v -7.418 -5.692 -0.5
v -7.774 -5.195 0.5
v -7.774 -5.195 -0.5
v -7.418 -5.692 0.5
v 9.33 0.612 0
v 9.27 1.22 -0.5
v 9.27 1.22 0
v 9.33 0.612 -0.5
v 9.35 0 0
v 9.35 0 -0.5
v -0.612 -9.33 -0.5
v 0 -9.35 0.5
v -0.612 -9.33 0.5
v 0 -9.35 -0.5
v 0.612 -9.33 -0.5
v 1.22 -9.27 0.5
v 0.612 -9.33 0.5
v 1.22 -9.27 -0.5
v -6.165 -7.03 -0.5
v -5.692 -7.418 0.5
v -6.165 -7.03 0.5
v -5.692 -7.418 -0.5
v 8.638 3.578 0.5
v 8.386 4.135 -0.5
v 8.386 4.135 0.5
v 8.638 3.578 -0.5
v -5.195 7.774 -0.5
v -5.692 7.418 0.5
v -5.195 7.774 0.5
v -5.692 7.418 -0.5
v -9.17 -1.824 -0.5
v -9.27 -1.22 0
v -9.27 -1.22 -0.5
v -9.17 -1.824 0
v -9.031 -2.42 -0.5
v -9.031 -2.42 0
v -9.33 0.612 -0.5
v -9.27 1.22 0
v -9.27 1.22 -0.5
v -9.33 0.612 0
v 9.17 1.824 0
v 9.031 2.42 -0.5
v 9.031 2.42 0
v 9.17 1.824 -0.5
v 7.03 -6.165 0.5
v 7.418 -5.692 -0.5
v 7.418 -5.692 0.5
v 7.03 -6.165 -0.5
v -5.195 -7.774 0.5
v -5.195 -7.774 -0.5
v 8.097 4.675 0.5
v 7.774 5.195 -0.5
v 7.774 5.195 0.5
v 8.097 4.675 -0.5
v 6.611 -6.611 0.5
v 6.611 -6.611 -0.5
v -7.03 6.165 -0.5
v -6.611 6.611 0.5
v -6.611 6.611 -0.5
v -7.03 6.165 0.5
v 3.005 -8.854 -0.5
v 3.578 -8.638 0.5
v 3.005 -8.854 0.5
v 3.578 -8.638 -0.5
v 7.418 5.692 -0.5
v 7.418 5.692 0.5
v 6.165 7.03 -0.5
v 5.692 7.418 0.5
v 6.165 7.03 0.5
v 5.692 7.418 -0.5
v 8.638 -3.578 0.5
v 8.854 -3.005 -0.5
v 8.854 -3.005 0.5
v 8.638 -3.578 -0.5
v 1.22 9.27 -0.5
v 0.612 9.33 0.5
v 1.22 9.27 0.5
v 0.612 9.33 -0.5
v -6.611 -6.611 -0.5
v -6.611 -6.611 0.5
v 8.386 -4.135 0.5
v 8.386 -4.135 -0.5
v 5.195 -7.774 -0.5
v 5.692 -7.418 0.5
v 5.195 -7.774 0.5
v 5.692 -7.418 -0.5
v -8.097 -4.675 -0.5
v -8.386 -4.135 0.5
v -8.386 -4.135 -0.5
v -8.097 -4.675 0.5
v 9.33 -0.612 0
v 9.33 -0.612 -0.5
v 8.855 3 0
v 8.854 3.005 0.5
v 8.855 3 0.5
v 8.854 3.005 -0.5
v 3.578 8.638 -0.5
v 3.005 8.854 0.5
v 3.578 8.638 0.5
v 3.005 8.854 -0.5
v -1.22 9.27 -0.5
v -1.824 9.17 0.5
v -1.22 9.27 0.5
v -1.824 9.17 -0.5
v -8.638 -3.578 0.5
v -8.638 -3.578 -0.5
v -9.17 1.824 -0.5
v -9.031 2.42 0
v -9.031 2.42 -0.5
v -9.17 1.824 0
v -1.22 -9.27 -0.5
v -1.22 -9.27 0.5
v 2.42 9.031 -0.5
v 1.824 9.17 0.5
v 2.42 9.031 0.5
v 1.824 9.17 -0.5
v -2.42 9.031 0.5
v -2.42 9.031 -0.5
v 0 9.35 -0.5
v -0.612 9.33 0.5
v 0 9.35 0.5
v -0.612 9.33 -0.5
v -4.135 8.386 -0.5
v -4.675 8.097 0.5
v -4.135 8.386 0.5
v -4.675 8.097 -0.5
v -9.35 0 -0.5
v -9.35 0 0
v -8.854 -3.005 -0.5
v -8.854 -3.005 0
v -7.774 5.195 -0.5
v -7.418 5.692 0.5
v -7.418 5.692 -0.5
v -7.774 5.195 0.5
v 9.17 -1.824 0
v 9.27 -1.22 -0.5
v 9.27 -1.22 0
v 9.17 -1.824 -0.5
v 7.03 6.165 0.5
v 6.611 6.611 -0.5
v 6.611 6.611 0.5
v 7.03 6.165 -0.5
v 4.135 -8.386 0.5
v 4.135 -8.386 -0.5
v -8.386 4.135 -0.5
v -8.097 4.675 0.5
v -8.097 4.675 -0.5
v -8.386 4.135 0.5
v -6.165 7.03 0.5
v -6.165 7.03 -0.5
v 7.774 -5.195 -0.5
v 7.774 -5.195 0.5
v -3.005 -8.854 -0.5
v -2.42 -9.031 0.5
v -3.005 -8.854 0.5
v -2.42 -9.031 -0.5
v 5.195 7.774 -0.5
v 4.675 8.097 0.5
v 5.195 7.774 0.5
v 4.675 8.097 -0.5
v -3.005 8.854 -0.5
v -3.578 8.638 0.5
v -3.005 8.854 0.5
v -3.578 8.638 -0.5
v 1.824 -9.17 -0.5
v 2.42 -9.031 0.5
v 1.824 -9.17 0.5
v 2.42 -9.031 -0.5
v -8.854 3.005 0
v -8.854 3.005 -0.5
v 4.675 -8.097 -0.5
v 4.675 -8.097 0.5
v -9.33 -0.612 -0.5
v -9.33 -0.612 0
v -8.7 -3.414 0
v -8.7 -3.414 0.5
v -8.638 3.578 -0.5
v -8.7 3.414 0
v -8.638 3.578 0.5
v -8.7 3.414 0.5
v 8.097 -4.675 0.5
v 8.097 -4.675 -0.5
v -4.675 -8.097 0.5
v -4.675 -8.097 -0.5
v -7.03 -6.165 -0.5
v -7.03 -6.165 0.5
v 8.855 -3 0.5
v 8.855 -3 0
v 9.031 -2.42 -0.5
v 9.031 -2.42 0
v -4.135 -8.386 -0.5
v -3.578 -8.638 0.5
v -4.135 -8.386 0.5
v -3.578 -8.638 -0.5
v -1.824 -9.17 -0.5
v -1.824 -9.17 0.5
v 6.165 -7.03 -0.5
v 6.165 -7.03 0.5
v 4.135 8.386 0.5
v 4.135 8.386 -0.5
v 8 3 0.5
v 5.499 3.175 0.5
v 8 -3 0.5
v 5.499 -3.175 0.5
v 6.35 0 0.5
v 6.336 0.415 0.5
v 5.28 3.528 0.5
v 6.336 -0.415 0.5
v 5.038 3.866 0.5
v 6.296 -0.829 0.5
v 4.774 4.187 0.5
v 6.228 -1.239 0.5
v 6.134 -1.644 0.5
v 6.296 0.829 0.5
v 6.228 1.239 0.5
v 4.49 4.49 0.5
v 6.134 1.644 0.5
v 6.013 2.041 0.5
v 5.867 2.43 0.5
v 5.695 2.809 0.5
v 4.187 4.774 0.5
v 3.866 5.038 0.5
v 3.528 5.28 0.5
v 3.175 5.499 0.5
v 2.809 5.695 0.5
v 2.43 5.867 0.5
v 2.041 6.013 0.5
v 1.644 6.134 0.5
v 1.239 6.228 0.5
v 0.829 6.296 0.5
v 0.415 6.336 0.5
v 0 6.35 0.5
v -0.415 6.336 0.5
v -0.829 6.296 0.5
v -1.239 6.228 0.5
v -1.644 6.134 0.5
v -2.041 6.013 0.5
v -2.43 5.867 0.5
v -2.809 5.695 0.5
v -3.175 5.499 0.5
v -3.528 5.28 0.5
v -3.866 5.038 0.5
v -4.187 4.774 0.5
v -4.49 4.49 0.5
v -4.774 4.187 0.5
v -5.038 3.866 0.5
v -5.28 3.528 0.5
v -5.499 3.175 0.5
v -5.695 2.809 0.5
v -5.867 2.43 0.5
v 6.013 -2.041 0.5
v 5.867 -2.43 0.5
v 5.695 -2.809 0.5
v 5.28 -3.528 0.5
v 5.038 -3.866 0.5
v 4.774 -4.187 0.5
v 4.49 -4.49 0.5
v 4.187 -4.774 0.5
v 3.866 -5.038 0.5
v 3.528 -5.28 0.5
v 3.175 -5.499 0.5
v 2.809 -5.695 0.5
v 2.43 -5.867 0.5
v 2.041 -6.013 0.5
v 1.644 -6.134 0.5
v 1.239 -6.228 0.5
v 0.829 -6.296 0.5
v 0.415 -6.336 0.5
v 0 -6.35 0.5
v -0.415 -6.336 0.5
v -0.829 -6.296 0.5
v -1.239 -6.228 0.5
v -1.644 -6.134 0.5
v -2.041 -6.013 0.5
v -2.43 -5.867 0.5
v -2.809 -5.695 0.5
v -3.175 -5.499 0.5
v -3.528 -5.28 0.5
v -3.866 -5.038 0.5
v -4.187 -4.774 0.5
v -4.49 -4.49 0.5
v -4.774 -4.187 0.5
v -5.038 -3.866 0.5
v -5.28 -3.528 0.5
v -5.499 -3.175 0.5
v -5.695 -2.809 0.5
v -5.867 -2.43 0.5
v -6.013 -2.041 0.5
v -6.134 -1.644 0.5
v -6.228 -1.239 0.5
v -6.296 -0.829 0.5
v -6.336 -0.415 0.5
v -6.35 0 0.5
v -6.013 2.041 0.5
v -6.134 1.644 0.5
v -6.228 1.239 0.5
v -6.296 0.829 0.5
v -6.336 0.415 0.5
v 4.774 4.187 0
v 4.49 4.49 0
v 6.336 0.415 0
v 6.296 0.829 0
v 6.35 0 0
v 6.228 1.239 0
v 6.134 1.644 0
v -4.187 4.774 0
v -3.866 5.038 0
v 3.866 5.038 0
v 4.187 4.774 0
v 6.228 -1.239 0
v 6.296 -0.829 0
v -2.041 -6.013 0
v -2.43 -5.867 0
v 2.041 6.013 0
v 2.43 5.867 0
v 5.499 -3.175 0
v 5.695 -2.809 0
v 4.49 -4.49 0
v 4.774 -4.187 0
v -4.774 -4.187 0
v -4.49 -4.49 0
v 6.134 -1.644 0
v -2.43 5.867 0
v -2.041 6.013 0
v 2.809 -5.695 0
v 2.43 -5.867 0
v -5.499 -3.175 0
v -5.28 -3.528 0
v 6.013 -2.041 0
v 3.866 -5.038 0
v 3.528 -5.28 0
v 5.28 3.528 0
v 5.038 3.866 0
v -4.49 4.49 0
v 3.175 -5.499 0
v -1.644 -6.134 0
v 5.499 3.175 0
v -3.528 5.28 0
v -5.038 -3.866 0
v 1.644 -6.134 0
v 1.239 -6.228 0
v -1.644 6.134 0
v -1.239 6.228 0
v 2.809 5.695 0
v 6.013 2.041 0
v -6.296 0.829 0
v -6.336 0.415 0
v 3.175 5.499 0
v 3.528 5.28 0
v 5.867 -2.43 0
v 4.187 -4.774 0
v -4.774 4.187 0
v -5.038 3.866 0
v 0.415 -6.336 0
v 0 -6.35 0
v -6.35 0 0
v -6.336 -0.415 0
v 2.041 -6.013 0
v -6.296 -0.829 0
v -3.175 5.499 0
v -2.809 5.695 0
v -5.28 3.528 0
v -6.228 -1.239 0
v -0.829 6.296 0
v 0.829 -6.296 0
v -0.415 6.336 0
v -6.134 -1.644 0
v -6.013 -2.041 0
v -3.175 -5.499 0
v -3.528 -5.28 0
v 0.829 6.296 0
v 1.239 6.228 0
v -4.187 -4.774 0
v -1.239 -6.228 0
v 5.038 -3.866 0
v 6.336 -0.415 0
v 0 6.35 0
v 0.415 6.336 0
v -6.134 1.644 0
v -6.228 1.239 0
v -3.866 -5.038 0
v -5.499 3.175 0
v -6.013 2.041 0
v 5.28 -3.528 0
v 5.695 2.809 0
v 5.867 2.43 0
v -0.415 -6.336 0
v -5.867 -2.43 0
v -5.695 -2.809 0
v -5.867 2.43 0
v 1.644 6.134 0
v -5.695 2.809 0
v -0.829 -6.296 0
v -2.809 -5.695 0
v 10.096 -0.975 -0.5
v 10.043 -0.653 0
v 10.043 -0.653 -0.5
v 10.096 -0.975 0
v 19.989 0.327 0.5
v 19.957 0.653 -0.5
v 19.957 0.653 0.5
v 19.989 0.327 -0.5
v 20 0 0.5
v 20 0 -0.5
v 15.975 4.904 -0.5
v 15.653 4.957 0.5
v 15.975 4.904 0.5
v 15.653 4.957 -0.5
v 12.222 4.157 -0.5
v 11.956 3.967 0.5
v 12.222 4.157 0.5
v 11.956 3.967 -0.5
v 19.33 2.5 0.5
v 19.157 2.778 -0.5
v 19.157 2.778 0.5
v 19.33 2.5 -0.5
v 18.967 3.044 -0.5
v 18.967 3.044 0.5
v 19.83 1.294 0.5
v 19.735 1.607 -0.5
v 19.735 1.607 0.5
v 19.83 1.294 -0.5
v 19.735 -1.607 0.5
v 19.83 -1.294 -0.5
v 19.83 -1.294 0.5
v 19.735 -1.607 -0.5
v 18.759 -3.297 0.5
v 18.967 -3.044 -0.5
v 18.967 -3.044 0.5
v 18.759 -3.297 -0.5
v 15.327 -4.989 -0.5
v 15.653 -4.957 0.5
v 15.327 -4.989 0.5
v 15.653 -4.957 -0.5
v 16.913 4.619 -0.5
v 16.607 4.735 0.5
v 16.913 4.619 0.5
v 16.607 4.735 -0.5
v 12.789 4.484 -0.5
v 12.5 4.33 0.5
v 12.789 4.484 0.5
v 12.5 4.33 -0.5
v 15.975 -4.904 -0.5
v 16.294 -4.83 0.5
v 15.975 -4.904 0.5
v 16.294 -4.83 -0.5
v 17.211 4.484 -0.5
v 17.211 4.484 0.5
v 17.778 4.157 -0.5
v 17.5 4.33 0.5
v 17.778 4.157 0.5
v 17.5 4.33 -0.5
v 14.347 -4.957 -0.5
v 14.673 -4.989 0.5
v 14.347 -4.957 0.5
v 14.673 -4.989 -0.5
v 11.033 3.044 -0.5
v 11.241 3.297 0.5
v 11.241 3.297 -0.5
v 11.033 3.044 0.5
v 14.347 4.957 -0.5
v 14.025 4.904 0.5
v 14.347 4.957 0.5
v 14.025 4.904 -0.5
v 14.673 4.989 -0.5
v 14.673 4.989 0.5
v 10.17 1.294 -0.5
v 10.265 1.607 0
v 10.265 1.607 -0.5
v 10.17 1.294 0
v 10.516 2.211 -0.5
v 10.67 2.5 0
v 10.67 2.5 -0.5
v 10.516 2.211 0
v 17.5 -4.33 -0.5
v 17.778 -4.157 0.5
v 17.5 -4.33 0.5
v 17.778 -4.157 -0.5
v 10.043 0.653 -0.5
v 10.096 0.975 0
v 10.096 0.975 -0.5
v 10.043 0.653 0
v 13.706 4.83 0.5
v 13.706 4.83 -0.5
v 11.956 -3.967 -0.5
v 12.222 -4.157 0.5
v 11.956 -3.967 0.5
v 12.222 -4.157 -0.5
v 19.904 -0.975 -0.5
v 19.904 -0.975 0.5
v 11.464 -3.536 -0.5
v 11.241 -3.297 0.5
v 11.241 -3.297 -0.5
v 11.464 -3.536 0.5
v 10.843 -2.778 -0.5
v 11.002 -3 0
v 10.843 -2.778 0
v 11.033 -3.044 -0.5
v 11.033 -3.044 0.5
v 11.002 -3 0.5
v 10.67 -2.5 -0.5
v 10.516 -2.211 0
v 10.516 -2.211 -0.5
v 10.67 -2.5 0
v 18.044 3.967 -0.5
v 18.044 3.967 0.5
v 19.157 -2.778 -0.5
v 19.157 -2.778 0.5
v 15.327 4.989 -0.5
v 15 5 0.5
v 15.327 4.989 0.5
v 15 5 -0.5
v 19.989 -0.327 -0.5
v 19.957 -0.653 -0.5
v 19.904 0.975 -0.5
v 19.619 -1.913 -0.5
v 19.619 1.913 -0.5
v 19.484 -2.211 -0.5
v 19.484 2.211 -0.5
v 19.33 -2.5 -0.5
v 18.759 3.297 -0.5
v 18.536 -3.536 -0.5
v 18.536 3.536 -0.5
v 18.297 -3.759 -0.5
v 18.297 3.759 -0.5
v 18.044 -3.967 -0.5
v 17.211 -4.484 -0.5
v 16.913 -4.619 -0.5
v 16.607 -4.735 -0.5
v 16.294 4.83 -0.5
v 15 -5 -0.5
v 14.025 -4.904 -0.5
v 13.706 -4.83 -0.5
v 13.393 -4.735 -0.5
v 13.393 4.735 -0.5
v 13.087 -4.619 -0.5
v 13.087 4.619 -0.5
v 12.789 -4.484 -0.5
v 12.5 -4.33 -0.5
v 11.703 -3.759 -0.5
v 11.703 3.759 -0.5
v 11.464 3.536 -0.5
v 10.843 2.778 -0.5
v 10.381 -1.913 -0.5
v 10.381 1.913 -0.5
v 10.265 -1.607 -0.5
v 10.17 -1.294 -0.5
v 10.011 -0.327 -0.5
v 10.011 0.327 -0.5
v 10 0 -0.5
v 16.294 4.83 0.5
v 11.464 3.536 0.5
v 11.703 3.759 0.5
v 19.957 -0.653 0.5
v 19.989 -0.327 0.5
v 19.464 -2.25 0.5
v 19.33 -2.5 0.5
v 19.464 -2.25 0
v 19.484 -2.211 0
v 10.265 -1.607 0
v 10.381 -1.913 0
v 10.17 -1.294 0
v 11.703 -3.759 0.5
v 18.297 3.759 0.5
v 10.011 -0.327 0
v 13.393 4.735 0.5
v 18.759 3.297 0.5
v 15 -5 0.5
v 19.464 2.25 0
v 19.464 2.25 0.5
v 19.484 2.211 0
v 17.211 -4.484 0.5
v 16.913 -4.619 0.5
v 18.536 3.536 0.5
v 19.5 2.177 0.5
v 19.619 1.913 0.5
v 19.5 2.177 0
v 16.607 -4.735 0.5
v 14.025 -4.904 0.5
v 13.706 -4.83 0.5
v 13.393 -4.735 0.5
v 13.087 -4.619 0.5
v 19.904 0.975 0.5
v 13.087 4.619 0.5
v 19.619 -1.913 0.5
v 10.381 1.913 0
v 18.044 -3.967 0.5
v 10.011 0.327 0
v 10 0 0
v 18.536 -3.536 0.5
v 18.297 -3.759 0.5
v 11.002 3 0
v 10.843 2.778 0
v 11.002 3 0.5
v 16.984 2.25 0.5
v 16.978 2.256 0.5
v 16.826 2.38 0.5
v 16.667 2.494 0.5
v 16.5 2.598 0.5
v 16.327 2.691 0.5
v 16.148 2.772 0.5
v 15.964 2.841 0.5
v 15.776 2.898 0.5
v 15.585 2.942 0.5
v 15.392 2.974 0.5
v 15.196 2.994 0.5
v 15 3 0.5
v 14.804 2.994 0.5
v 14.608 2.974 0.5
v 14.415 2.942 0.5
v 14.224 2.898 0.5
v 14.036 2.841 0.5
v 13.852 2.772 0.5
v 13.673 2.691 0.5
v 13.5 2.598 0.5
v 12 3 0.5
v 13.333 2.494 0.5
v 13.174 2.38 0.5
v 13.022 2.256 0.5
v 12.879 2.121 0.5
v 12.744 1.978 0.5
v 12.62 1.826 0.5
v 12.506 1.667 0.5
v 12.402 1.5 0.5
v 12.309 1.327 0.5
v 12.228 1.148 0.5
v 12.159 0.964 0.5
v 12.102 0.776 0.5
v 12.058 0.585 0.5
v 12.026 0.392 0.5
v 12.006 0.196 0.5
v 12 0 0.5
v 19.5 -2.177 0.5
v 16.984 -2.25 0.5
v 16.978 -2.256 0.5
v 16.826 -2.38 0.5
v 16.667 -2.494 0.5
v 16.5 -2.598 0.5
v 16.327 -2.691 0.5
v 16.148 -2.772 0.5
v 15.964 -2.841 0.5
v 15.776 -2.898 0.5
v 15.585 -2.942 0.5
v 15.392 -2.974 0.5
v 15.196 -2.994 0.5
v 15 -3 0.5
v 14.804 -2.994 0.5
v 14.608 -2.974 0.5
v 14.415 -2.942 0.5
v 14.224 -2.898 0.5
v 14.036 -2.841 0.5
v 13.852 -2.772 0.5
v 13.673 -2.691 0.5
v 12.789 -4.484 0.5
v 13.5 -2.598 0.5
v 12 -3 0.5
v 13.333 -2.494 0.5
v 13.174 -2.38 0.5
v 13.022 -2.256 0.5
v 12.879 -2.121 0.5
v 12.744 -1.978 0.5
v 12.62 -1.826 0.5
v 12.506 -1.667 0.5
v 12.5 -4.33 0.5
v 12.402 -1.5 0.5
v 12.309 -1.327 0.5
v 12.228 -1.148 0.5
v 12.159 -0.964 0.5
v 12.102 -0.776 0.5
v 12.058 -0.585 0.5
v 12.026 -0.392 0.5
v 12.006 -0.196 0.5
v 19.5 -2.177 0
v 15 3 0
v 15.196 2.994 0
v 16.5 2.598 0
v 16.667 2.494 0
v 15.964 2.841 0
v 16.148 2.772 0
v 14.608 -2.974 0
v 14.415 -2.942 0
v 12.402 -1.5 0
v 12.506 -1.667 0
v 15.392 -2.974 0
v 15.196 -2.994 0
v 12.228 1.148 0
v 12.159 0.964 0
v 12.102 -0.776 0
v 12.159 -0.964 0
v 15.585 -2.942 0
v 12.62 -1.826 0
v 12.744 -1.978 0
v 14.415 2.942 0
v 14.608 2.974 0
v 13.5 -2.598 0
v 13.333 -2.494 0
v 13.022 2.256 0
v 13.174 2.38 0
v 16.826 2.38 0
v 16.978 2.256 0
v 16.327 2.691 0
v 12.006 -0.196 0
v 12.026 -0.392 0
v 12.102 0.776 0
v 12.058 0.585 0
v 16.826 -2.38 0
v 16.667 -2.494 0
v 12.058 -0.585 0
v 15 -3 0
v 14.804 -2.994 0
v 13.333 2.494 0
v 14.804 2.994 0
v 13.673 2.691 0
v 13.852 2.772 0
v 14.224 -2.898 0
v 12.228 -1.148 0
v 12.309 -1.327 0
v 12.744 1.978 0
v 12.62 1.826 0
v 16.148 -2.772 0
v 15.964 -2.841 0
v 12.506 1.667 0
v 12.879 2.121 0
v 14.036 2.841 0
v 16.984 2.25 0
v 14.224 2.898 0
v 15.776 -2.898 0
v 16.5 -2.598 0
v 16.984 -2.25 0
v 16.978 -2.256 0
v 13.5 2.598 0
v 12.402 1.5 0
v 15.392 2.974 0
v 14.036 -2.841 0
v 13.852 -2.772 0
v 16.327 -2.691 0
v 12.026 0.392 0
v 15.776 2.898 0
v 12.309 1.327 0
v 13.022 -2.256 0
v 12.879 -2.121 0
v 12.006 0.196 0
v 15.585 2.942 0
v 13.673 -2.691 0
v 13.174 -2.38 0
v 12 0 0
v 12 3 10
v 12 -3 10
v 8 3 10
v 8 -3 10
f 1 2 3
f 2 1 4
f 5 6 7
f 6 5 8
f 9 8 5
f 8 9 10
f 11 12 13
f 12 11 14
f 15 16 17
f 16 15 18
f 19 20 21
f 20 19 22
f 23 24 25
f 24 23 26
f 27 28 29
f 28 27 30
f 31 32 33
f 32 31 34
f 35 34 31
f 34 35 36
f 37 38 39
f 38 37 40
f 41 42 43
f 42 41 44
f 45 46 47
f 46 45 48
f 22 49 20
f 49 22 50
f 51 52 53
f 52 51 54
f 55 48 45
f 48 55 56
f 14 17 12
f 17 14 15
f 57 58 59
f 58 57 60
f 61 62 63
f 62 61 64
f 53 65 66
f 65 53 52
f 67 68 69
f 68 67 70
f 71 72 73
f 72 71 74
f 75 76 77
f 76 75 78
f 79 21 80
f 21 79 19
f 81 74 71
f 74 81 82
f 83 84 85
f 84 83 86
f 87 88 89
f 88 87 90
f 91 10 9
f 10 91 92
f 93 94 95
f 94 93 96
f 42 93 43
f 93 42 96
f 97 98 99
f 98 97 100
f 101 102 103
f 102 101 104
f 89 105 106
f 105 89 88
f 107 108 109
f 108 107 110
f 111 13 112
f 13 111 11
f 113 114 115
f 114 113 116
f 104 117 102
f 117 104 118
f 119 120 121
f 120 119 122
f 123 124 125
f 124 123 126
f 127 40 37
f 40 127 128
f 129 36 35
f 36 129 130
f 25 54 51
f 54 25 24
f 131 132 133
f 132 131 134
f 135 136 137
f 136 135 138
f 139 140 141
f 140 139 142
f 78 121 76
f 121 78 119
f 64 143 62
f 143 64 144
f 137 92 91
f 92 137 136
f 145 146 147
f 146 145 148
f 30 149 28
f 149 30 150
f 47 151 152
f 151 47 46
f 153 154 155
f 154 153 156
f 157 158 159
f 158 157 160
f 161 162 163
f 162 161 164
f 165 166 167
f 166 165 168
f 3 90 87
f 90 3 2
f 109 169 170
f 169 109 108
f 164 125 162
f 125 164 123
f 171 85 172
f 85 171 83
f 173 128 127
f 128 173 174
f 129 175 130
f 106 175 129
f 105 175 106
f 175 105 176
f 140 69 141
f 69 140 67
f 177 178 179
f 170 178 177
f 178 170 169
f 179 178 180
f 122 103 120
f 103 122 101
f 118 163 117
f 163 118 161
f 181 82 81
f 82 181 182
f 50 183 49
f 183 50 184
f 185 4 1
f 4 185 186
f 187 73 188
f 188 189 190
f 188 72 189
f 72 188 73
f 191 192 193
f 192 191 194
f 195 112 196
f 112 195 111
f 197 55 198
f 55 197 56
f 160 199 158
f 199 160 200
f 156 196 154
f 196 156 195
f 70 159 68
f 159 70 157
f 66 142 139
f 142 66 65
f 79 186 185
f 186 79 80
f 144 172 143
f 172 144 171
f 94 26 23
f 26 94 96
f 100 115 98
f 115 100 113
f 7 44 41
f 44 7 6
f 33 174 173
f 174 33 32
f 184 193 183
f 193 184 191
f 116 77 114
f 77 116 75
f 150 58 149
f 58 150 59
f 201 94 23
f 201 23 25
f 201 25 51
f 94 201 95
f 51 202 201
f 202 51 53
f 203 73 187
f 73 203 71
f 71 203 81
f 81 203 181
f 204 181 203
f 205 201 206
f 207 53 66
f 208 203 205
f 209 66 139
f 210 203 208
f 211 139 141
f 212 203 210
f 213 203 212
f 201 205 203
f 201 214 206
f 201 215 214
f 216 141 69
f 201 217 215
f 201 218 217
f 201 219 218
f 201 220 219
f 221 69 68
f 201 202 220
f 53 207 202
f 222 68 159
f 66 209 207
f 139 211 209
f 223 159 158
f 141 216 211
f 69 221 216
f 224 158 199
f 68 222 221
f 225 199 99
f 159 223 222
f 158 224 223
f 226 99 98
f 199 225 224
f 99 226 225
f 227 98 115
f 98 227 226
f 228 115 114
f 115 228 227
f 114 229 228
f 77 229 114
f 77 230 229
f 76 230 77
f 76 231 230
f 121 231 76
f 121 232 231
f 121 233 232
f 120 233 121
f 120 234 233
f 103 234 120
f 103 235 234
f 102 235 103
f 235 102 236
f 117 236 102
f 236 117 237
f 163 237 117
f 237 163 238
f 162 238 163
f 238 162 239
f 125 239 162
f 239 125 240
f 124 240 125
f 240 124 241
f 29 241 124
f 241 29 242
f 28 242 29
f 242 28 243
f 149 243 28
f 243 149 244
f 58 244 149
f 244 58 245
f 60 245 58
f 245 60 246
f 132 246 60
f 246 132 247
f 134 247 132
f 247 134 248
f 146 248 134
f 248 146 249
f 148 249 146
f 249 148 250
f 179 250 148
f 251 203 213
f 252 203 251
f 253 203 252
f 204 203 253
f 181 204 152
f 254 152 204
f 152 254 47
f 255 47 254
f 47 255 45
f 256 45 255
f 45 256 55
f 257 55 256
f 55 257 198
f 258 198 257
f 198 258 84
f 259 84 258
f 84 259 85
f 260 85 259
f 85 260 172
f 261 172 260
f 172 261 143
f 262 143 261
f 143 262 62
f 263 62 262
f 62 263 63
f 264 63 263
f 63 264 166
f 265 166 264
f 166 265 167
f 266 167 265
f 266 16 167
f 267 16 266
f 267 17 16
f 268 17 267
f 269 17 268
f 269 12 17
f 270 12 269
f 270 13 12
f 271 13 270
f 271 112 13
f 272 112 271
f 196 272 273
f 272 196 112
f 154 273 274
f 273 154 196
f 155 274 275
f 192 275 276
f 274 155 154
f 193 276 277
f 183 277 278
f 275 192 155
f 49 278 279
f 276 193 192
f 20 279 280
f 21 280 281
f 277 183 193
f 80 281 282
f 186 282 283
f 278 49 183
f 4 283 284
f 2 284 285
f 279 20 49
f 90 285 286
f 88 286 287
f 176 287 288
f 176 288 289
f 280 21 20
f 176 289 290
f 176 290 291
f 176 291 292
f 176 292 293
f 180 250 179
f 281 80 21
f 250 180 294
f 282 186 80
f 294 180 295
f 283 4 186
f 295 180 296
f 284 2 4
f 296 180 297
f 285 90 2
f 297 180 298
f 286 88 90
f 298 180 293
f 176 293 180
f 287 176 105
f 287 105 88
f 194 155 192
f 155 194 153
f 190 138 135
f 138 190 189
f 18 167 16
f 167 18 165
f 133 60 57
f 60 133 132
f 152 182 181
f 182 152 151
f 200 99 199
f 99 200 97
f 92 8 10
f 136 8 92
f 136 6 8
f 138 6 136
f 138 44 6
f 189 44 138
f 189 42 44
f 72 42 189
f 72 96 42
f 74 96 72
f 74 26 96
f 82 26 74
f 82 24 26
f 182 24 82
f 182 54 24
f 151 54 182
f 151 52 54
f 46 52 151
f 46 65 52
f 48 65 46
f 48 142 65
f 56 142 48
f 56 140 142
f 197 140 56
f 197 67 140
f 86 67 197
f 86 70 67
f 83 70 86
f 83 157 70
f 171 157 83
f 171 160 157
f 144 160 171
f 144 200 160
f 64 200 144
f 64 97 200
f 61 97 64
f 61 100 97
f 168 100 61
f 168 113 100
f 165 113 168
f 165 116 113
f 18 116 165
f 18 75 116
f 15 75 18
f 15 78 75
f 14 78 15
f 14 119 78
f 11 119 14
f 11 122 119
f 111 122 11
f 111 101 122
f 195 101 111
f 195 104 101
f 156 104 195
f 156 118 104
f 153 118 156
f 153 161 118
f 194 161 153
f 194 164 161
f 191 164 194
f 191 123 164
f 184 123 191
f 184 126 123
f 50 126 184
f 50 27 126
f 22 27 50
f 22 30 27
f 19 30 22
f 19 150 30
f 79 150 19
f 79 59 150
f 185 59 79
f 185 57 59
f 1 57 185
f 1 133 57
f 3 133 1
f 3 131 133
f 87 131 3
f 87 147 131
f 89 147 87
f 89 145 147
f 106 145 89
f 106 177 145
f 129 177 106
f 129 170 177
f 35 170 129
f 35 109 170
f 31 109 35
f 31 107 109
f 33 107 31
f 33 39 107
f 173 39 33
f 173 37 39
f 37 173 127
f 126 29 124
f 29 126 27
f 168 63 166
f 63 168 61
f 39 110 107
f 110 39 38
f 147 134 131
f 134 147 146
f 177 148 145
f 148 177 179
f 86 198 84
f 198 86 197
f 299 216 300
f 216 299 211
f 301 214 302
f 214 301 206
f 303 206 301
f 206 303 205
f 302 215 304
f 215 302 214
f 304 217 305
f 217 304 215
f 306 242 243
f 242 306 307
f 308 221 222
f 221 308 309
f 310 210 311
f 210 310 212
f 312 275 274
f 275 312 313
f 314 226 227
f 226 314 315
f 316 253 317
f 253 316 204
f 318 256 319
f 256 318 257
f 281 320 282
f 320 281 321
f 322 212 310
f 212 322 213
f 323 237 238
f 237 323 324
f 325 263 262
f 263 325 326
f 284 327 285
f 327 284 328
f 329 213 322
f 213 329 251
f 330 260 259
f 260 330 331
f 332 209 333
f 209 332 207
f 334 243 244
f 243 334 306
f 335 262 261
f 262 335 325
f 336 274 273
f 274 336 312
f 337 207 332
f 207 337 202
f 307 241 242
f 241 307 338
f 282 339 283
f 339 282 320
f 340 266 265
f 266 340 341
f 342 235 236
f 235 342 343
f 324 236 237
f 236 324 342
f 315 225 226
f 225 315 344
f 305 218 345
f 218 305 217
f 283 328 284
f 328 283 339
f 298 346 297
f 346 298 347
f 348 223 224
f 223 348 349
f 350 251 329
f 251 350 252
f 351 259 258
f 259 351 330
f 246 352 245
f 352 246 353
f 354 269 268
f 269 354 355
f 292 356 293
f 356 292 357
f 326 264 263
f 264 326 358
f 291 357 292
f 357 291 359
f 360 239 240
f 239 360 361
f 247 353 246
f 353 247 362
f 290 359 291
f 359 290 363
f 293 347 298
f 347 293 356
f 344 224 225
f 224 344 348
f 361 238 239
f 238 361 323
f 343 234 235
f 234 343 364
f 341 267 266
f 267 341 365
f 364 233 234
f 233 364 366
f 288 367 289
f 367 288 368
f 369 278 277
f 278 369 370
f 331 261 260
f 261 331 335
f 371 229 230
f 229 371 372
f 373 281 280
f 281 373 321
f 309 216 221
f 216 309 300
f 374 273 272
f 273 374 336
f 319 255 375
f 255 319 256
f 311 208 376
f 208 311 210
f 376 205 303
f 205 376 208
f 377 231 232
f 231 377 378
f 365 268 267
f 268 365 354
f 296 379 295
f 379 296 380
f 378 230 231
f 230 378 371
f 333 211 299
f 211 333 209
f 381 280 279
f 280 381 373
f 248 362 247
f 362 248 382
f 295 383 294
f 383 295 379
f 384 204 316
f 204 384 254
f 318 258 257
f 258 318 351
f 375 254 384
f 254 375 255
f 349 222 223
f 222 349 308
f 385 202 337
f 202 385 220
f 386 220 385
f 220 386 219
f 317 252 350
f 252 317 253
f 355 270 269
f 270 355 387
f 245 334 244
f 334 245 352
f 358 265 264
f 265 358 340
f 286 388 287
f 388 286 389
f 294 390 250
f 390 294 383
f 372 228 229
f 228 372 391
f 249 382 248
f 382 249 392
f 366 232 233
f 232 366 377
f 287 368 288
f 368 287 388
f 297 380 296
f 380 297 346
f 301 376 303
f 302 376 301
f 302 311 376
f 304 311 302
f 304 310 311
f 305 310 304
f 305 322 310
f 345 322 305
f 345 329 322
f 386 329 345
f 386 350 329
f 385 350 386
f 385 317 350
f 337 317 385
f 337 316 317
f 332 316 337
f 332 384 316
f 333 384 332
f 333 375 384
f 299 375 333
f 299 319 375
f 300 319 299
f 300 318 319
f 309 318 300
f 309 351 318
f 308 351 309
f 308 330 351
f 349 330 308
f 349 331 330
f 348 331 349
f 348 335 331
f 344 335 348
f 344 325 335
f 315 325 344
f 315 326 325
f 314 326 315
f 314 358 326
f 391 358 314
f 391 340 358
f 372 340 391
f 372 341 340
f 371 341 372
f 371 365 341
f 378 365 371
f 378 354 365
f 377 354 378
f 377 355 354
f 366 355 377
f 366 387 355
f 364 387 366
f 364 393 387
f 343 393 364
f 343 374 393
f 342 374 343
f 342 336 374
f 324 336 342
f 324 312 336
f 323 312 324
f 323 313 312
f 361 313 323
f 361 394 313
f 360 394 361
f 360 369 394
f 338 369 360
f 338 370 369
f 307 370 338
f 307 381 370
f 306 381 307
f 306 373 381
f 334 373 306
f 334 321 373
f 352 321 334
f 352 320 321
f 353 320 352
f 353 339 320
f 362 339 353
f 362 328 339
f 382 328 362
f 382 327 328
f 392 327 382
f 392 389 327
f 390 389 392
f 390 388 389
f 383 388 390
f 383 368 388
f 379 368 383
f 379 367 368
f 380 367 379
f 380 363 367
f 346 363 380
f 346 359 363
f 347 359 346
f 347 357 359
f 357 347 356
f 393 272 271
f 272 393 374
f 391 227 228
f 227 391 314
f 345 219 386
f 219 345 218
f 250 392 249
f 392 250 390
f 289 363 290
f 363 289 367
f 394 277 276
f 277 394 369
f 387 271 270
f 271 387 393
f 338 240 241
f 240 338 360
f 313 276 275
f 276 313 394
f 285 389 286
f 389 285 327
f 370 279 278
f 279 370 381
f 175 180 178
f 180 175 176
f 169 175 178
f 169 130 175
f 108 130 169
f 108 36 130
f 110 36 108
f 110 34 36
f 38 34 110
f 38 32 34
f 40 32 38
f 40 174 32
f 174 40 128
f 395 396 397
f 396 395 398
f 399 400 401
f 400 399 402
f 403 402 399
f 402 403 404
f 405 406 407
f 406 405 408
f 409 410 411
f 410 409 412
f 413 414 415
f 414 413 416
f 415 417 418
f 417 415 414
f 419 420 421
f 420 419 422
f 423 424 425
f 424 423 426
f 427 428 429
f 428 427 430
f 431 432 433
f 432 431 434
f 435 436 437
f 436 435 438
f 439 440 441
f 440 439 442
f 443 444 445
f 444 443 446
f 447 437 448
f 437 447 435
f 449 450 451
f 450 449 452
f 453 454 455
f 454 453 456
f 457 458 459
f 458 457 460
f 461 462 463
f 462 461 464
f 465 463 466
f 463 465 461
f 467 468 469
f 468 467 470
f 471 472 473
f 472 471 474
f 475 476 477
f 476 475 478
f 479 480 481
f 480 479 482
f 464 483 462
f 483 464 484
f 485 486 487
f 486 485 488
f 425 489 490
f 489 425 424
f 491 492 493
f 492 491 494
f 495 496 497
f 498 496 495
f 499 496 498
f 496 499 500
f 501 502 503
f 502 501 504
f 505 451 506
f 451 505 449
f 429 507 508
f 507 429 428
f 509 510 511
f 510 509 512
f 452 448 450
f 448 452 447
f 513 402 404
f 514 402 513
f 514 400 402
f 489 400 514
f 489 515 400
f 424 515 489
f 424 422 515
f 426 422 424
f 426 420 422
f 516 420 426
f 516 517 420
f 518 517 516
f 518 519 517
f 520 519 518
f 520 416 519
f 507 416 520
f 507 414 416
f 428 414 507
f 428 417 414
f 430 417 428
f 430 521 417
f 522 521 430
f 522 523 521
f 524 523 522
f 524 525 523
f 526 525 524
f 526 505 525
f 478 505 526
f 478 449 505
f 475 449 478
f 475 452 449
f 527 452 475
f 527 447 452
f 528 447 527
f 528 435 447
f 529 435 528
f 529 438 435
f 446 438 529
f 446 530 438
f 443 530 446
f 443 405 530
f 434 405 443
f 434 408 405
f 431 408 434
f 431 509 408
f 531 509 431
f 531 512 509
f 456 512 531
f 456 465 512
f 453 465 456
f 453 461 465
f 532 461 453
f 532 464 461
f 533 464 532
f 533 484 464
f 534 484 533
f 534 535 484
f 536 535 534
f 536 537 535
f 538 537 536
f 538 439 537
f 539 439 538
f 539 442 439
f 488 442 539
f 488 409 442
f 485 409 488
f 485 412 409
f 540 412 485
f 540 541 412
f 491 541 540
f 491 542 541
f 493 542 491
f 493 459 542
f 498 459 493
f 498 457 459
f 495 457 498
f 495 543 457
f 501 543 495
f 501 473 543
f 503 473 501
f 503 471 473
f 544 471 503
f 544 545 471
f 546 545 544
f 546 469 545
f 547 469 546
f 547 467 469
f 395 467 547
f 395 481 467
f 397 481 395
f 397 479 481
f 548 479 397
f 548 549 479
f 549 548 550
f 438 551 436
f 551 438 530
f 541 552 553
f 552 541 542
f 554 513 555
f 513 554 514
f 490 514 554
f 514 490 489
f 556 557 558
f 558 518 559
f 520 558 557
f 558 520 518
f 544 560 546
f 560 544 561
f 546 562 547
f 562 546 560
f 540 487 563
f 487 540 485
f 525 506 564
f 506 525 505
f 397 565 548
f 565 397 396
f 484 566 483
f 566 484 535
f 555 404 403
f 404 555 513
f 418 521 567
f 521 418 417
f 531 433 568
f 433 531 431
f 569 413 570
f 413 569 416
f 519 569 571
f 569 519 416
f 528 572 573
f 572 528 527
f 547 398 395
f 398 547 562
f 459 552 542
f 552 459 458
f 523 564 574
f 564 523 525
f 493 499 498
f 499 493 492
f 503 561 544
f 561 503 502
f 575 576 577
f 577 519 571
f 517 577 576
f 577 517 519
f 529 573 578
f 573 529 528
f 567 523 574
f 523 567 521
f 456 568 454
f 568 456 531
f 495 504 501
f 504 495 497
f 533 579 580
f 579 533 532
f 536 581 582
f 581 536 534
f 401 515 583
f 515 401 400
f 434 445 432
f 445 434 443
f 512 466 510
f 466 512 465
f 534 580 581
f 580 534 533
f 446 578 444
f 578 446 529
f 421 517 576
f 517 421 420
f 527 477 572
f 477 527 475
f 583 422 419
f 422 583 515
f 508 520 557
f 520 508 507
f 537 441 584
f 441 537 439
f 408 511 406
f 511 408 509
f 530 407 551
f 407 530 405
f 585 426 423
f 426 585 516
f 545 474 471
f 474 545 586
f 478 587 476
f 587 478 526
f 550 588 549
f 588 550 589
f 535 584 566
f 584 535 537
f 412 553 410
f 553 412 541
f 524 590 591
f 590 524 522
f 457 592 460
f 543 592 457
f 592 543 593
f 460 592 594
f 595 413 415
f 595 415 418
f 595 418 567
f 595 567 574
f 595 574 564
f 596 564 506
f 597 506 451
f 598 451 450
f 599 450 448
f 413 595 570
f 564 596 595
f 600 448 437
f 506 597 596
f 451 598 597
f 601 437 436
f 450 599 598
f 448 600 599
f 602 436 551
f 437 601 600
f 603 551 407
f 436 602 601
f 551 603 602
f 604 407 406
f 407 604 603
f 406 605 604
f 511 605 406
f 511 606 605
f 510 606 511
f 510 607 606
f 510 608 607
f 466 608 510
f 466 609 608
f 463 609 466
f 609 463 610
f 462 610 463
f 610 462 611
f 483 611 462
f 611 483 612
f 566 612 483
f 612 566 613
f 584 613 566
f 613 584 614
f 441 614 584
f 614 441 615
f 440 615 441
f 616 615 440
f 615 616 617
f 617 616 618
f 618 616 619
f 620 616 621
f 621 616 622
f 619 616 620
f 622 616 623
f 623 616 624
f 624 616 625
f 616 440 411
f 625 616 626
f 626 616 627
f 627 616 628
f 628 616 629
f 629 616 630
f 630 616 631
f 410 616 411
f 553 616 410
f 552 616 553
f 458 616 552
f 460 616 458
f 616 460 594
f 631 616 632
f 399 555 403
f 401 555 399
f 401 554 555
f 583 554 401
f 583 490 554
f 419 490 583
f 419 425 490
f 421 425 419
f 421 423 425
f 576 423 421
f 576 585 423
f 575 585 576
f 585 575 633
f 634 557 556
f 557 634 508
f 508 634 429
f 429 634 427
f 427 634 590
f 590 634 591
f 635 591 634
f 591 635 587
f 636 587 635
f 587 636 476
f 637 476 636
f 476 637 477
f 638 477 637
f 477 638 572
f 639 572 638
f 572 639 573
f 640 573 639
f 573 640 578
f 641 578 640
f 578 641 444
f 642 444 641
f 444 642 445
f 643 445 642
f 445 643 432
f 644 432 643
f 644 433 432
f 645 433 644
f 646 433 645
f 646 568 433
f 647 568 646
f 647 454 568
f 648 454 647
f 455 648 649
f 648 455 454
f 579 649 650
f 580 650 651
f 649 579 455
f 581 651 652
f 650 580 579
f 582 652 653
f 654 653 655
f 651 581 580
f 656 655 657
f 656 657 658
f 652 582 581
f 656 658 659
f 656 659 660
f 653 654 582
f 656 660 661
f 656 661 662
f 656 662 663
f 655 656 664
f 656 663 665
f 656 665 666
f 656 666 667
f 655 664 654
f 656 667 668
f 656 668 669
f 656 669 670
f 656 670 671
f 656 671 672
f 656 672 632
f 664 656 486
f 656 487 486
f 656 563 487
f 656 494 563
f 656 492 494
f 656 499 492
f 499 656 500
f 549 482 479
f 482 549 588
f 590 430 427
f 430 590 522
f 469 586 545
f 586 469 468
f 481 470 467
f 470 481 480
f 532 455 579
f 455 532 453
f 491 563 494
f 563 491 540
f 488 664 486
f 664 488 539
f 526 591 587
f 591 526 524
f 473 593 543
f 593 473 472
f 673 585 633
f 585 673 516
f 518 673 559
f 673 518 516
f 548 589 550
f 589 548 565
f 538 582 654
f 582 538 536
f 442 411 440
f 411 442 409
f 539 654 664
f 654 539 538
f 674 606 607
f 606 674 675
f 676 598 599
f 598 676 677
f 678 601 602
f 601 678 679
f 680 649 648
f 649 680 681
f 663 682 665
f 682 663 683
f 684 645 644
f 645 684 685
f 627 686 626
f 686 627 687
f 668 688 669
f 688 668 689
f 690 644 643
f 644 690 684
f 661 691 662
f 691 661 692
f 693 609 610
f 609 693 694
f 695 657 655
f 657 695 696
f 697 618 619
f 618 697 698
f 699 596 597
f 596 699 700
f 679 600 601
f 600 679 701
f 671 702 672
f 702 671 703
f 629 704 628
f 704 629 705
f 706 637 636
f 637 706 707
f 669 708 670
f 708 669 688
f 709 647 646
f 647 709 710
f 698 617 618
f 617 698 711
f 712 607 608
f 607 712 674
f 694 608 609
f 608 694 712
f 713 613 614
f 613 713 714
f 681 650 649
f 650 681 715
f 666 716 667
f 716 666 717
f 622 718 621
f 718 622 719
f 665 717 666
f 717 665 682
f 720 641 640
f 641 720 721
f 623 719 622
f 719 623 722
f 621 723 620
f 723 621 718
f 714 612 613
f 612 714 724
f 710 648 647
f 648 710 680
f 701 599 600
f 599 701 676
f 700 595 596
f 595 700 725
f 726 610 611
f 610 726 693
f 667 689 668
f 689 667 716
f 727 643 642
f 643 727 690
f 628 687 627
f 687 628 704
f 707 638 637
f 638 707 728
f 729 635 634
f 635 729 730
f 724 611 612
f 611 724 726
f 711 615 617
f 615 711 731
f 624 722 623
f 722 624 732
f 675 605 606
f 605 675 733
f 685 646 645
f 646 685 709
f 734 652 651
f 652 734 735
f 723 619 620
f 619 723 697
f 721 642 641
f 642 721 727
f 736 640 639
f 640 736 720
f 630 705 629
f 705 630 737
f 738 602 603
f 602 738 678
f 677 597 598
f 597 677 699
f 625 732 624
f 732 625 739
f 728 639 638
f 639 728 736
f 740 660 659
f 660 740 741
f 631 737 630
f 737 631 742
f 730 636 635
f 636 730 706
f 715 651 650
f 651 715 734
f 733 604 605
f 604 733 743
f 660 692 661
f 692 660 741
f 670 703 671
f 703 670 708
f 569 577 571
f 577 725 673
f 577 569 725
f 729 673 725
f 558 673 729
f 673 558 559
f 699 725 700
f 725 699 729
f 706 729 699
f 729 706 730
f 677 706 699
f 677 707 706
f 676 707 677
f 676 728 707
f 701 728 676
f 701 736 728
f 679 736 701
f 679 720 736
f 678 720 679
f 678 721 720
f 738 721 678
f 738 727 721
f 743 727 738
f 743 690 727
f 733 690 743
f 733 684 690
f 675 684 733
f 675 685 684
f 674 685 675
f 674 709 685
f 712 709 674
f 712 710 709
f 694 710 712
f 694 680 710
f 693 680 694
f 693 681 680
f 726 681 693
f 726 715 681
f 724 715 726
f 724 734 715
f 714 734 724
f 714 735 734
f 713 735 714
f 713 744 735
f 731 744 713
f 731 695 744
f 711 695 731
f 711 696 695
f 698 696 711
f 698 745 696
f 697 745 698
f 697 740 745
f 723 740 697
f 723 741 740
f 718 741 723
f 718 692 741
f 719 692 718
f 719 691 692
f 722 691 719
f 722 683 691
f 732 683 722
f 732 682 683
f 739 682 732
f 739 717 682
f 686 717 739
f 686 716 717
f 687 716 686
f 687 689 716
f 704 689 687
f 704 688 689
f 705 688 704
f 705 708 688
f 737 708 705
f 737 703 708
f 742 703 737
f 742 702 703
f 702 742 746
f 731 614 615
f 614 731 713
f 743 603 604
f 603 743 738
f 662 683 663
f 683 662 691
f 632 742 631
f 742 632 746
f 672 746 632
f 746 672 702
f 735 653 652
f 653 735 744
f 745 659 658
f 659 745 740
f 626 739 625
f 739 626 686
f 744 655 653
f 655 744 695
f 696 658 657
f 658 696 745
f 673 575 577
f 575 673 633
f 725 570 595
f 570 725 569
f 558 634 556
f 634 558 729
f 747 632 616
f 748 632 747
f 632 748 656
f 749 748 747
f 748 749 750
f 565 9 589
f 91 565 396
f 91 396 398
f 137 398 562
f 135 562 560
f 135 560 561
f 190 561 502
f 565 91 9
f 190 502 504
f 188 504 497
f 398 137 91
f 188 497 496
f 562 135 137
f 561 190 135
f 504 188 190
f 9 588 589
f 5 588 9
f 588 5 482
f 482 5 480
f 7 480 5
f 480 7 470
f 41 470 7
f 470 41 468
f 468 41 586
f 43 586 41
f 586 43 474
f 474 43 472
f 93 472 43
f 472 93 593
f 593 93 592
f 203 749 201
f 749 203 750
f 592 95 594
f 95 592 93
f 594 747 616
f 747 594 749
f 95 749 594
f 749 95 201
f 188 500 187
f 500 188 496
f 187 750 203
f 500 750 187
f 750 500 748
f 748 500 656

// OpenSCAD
// Tubing clip for 12.7 mm (1/2 inch) lab stand rod
// Print orientation: flat on bed, extrusion along Z (height = 10 mm)

// ---------------- Parameters ----------------
rod_d        = 12.7;   // stand rod inner diameter
rod_wall     = 3;      // stand rod ring wall thickness
ring_opening = 10;     // width of opening cut from -X side of rod ring

tub_d        = 6;      // tubing inner diameter
tub_wall     = 2;      // tubing ring wall thickness
tub_opening  = 4.5;    // width of opening cut from +X side of tubing ring

bridge_w     = 6;      // bridge width (Y)
bridge_x0    = 8;      // bridge start (X)
bridge_x1    = 12;     // bridge end (X)

eps          = 0.5;    // cutter overshoot past faces
$fn          = 96;     // curve resolution

// Derived
rod_outer = rod_d + 2 * rod_wall;   // 18.7 mm
tub_outer = tub_d + 2 * tub_wall;   // 10 mm

// ---------------- Modules ----------------
module rod_ring() {
    difference() {
        // Ring centred at origin
        translate([0, 0, -eps])
            cylinder(h = 2 * eps, d = rod_outer);
        translate([0, 0, 0])
            cylinder(h = height, d = rod_d);
        // Opening cut from -X side (-5 < y < 5)
        translate([-rod_outer, -ring_opening / 2, 0])
            cube([ring_opening, ring_opening, height + 2 * eps]);
    }
}

module tub_ring() {
    difference() {
        translate([15, 0, -eps])
            cylinder(h = 2 * eps, d = tub_outer);
        translate([15, 0, 0])
            cylinder(h = height, d = tub_d);
        // Opening cut from +X side (x > 15, -2.25 < y < 2.25)
        translate([15, -tub_opening / 2, 0])
            cube([tub_opening, tub_opening, height + 2 * eps]);
    }
}

module bridge() {
    translate([bridge_x0, -bridge_w / 2, 0])
        cube([bridge_x1 - bridge_x0, bridge_w, height]);
}

// ---------------- Part ----------------
height = 10;
union() {
    rod_ring();
    tub_ring();
    bridge();
}
